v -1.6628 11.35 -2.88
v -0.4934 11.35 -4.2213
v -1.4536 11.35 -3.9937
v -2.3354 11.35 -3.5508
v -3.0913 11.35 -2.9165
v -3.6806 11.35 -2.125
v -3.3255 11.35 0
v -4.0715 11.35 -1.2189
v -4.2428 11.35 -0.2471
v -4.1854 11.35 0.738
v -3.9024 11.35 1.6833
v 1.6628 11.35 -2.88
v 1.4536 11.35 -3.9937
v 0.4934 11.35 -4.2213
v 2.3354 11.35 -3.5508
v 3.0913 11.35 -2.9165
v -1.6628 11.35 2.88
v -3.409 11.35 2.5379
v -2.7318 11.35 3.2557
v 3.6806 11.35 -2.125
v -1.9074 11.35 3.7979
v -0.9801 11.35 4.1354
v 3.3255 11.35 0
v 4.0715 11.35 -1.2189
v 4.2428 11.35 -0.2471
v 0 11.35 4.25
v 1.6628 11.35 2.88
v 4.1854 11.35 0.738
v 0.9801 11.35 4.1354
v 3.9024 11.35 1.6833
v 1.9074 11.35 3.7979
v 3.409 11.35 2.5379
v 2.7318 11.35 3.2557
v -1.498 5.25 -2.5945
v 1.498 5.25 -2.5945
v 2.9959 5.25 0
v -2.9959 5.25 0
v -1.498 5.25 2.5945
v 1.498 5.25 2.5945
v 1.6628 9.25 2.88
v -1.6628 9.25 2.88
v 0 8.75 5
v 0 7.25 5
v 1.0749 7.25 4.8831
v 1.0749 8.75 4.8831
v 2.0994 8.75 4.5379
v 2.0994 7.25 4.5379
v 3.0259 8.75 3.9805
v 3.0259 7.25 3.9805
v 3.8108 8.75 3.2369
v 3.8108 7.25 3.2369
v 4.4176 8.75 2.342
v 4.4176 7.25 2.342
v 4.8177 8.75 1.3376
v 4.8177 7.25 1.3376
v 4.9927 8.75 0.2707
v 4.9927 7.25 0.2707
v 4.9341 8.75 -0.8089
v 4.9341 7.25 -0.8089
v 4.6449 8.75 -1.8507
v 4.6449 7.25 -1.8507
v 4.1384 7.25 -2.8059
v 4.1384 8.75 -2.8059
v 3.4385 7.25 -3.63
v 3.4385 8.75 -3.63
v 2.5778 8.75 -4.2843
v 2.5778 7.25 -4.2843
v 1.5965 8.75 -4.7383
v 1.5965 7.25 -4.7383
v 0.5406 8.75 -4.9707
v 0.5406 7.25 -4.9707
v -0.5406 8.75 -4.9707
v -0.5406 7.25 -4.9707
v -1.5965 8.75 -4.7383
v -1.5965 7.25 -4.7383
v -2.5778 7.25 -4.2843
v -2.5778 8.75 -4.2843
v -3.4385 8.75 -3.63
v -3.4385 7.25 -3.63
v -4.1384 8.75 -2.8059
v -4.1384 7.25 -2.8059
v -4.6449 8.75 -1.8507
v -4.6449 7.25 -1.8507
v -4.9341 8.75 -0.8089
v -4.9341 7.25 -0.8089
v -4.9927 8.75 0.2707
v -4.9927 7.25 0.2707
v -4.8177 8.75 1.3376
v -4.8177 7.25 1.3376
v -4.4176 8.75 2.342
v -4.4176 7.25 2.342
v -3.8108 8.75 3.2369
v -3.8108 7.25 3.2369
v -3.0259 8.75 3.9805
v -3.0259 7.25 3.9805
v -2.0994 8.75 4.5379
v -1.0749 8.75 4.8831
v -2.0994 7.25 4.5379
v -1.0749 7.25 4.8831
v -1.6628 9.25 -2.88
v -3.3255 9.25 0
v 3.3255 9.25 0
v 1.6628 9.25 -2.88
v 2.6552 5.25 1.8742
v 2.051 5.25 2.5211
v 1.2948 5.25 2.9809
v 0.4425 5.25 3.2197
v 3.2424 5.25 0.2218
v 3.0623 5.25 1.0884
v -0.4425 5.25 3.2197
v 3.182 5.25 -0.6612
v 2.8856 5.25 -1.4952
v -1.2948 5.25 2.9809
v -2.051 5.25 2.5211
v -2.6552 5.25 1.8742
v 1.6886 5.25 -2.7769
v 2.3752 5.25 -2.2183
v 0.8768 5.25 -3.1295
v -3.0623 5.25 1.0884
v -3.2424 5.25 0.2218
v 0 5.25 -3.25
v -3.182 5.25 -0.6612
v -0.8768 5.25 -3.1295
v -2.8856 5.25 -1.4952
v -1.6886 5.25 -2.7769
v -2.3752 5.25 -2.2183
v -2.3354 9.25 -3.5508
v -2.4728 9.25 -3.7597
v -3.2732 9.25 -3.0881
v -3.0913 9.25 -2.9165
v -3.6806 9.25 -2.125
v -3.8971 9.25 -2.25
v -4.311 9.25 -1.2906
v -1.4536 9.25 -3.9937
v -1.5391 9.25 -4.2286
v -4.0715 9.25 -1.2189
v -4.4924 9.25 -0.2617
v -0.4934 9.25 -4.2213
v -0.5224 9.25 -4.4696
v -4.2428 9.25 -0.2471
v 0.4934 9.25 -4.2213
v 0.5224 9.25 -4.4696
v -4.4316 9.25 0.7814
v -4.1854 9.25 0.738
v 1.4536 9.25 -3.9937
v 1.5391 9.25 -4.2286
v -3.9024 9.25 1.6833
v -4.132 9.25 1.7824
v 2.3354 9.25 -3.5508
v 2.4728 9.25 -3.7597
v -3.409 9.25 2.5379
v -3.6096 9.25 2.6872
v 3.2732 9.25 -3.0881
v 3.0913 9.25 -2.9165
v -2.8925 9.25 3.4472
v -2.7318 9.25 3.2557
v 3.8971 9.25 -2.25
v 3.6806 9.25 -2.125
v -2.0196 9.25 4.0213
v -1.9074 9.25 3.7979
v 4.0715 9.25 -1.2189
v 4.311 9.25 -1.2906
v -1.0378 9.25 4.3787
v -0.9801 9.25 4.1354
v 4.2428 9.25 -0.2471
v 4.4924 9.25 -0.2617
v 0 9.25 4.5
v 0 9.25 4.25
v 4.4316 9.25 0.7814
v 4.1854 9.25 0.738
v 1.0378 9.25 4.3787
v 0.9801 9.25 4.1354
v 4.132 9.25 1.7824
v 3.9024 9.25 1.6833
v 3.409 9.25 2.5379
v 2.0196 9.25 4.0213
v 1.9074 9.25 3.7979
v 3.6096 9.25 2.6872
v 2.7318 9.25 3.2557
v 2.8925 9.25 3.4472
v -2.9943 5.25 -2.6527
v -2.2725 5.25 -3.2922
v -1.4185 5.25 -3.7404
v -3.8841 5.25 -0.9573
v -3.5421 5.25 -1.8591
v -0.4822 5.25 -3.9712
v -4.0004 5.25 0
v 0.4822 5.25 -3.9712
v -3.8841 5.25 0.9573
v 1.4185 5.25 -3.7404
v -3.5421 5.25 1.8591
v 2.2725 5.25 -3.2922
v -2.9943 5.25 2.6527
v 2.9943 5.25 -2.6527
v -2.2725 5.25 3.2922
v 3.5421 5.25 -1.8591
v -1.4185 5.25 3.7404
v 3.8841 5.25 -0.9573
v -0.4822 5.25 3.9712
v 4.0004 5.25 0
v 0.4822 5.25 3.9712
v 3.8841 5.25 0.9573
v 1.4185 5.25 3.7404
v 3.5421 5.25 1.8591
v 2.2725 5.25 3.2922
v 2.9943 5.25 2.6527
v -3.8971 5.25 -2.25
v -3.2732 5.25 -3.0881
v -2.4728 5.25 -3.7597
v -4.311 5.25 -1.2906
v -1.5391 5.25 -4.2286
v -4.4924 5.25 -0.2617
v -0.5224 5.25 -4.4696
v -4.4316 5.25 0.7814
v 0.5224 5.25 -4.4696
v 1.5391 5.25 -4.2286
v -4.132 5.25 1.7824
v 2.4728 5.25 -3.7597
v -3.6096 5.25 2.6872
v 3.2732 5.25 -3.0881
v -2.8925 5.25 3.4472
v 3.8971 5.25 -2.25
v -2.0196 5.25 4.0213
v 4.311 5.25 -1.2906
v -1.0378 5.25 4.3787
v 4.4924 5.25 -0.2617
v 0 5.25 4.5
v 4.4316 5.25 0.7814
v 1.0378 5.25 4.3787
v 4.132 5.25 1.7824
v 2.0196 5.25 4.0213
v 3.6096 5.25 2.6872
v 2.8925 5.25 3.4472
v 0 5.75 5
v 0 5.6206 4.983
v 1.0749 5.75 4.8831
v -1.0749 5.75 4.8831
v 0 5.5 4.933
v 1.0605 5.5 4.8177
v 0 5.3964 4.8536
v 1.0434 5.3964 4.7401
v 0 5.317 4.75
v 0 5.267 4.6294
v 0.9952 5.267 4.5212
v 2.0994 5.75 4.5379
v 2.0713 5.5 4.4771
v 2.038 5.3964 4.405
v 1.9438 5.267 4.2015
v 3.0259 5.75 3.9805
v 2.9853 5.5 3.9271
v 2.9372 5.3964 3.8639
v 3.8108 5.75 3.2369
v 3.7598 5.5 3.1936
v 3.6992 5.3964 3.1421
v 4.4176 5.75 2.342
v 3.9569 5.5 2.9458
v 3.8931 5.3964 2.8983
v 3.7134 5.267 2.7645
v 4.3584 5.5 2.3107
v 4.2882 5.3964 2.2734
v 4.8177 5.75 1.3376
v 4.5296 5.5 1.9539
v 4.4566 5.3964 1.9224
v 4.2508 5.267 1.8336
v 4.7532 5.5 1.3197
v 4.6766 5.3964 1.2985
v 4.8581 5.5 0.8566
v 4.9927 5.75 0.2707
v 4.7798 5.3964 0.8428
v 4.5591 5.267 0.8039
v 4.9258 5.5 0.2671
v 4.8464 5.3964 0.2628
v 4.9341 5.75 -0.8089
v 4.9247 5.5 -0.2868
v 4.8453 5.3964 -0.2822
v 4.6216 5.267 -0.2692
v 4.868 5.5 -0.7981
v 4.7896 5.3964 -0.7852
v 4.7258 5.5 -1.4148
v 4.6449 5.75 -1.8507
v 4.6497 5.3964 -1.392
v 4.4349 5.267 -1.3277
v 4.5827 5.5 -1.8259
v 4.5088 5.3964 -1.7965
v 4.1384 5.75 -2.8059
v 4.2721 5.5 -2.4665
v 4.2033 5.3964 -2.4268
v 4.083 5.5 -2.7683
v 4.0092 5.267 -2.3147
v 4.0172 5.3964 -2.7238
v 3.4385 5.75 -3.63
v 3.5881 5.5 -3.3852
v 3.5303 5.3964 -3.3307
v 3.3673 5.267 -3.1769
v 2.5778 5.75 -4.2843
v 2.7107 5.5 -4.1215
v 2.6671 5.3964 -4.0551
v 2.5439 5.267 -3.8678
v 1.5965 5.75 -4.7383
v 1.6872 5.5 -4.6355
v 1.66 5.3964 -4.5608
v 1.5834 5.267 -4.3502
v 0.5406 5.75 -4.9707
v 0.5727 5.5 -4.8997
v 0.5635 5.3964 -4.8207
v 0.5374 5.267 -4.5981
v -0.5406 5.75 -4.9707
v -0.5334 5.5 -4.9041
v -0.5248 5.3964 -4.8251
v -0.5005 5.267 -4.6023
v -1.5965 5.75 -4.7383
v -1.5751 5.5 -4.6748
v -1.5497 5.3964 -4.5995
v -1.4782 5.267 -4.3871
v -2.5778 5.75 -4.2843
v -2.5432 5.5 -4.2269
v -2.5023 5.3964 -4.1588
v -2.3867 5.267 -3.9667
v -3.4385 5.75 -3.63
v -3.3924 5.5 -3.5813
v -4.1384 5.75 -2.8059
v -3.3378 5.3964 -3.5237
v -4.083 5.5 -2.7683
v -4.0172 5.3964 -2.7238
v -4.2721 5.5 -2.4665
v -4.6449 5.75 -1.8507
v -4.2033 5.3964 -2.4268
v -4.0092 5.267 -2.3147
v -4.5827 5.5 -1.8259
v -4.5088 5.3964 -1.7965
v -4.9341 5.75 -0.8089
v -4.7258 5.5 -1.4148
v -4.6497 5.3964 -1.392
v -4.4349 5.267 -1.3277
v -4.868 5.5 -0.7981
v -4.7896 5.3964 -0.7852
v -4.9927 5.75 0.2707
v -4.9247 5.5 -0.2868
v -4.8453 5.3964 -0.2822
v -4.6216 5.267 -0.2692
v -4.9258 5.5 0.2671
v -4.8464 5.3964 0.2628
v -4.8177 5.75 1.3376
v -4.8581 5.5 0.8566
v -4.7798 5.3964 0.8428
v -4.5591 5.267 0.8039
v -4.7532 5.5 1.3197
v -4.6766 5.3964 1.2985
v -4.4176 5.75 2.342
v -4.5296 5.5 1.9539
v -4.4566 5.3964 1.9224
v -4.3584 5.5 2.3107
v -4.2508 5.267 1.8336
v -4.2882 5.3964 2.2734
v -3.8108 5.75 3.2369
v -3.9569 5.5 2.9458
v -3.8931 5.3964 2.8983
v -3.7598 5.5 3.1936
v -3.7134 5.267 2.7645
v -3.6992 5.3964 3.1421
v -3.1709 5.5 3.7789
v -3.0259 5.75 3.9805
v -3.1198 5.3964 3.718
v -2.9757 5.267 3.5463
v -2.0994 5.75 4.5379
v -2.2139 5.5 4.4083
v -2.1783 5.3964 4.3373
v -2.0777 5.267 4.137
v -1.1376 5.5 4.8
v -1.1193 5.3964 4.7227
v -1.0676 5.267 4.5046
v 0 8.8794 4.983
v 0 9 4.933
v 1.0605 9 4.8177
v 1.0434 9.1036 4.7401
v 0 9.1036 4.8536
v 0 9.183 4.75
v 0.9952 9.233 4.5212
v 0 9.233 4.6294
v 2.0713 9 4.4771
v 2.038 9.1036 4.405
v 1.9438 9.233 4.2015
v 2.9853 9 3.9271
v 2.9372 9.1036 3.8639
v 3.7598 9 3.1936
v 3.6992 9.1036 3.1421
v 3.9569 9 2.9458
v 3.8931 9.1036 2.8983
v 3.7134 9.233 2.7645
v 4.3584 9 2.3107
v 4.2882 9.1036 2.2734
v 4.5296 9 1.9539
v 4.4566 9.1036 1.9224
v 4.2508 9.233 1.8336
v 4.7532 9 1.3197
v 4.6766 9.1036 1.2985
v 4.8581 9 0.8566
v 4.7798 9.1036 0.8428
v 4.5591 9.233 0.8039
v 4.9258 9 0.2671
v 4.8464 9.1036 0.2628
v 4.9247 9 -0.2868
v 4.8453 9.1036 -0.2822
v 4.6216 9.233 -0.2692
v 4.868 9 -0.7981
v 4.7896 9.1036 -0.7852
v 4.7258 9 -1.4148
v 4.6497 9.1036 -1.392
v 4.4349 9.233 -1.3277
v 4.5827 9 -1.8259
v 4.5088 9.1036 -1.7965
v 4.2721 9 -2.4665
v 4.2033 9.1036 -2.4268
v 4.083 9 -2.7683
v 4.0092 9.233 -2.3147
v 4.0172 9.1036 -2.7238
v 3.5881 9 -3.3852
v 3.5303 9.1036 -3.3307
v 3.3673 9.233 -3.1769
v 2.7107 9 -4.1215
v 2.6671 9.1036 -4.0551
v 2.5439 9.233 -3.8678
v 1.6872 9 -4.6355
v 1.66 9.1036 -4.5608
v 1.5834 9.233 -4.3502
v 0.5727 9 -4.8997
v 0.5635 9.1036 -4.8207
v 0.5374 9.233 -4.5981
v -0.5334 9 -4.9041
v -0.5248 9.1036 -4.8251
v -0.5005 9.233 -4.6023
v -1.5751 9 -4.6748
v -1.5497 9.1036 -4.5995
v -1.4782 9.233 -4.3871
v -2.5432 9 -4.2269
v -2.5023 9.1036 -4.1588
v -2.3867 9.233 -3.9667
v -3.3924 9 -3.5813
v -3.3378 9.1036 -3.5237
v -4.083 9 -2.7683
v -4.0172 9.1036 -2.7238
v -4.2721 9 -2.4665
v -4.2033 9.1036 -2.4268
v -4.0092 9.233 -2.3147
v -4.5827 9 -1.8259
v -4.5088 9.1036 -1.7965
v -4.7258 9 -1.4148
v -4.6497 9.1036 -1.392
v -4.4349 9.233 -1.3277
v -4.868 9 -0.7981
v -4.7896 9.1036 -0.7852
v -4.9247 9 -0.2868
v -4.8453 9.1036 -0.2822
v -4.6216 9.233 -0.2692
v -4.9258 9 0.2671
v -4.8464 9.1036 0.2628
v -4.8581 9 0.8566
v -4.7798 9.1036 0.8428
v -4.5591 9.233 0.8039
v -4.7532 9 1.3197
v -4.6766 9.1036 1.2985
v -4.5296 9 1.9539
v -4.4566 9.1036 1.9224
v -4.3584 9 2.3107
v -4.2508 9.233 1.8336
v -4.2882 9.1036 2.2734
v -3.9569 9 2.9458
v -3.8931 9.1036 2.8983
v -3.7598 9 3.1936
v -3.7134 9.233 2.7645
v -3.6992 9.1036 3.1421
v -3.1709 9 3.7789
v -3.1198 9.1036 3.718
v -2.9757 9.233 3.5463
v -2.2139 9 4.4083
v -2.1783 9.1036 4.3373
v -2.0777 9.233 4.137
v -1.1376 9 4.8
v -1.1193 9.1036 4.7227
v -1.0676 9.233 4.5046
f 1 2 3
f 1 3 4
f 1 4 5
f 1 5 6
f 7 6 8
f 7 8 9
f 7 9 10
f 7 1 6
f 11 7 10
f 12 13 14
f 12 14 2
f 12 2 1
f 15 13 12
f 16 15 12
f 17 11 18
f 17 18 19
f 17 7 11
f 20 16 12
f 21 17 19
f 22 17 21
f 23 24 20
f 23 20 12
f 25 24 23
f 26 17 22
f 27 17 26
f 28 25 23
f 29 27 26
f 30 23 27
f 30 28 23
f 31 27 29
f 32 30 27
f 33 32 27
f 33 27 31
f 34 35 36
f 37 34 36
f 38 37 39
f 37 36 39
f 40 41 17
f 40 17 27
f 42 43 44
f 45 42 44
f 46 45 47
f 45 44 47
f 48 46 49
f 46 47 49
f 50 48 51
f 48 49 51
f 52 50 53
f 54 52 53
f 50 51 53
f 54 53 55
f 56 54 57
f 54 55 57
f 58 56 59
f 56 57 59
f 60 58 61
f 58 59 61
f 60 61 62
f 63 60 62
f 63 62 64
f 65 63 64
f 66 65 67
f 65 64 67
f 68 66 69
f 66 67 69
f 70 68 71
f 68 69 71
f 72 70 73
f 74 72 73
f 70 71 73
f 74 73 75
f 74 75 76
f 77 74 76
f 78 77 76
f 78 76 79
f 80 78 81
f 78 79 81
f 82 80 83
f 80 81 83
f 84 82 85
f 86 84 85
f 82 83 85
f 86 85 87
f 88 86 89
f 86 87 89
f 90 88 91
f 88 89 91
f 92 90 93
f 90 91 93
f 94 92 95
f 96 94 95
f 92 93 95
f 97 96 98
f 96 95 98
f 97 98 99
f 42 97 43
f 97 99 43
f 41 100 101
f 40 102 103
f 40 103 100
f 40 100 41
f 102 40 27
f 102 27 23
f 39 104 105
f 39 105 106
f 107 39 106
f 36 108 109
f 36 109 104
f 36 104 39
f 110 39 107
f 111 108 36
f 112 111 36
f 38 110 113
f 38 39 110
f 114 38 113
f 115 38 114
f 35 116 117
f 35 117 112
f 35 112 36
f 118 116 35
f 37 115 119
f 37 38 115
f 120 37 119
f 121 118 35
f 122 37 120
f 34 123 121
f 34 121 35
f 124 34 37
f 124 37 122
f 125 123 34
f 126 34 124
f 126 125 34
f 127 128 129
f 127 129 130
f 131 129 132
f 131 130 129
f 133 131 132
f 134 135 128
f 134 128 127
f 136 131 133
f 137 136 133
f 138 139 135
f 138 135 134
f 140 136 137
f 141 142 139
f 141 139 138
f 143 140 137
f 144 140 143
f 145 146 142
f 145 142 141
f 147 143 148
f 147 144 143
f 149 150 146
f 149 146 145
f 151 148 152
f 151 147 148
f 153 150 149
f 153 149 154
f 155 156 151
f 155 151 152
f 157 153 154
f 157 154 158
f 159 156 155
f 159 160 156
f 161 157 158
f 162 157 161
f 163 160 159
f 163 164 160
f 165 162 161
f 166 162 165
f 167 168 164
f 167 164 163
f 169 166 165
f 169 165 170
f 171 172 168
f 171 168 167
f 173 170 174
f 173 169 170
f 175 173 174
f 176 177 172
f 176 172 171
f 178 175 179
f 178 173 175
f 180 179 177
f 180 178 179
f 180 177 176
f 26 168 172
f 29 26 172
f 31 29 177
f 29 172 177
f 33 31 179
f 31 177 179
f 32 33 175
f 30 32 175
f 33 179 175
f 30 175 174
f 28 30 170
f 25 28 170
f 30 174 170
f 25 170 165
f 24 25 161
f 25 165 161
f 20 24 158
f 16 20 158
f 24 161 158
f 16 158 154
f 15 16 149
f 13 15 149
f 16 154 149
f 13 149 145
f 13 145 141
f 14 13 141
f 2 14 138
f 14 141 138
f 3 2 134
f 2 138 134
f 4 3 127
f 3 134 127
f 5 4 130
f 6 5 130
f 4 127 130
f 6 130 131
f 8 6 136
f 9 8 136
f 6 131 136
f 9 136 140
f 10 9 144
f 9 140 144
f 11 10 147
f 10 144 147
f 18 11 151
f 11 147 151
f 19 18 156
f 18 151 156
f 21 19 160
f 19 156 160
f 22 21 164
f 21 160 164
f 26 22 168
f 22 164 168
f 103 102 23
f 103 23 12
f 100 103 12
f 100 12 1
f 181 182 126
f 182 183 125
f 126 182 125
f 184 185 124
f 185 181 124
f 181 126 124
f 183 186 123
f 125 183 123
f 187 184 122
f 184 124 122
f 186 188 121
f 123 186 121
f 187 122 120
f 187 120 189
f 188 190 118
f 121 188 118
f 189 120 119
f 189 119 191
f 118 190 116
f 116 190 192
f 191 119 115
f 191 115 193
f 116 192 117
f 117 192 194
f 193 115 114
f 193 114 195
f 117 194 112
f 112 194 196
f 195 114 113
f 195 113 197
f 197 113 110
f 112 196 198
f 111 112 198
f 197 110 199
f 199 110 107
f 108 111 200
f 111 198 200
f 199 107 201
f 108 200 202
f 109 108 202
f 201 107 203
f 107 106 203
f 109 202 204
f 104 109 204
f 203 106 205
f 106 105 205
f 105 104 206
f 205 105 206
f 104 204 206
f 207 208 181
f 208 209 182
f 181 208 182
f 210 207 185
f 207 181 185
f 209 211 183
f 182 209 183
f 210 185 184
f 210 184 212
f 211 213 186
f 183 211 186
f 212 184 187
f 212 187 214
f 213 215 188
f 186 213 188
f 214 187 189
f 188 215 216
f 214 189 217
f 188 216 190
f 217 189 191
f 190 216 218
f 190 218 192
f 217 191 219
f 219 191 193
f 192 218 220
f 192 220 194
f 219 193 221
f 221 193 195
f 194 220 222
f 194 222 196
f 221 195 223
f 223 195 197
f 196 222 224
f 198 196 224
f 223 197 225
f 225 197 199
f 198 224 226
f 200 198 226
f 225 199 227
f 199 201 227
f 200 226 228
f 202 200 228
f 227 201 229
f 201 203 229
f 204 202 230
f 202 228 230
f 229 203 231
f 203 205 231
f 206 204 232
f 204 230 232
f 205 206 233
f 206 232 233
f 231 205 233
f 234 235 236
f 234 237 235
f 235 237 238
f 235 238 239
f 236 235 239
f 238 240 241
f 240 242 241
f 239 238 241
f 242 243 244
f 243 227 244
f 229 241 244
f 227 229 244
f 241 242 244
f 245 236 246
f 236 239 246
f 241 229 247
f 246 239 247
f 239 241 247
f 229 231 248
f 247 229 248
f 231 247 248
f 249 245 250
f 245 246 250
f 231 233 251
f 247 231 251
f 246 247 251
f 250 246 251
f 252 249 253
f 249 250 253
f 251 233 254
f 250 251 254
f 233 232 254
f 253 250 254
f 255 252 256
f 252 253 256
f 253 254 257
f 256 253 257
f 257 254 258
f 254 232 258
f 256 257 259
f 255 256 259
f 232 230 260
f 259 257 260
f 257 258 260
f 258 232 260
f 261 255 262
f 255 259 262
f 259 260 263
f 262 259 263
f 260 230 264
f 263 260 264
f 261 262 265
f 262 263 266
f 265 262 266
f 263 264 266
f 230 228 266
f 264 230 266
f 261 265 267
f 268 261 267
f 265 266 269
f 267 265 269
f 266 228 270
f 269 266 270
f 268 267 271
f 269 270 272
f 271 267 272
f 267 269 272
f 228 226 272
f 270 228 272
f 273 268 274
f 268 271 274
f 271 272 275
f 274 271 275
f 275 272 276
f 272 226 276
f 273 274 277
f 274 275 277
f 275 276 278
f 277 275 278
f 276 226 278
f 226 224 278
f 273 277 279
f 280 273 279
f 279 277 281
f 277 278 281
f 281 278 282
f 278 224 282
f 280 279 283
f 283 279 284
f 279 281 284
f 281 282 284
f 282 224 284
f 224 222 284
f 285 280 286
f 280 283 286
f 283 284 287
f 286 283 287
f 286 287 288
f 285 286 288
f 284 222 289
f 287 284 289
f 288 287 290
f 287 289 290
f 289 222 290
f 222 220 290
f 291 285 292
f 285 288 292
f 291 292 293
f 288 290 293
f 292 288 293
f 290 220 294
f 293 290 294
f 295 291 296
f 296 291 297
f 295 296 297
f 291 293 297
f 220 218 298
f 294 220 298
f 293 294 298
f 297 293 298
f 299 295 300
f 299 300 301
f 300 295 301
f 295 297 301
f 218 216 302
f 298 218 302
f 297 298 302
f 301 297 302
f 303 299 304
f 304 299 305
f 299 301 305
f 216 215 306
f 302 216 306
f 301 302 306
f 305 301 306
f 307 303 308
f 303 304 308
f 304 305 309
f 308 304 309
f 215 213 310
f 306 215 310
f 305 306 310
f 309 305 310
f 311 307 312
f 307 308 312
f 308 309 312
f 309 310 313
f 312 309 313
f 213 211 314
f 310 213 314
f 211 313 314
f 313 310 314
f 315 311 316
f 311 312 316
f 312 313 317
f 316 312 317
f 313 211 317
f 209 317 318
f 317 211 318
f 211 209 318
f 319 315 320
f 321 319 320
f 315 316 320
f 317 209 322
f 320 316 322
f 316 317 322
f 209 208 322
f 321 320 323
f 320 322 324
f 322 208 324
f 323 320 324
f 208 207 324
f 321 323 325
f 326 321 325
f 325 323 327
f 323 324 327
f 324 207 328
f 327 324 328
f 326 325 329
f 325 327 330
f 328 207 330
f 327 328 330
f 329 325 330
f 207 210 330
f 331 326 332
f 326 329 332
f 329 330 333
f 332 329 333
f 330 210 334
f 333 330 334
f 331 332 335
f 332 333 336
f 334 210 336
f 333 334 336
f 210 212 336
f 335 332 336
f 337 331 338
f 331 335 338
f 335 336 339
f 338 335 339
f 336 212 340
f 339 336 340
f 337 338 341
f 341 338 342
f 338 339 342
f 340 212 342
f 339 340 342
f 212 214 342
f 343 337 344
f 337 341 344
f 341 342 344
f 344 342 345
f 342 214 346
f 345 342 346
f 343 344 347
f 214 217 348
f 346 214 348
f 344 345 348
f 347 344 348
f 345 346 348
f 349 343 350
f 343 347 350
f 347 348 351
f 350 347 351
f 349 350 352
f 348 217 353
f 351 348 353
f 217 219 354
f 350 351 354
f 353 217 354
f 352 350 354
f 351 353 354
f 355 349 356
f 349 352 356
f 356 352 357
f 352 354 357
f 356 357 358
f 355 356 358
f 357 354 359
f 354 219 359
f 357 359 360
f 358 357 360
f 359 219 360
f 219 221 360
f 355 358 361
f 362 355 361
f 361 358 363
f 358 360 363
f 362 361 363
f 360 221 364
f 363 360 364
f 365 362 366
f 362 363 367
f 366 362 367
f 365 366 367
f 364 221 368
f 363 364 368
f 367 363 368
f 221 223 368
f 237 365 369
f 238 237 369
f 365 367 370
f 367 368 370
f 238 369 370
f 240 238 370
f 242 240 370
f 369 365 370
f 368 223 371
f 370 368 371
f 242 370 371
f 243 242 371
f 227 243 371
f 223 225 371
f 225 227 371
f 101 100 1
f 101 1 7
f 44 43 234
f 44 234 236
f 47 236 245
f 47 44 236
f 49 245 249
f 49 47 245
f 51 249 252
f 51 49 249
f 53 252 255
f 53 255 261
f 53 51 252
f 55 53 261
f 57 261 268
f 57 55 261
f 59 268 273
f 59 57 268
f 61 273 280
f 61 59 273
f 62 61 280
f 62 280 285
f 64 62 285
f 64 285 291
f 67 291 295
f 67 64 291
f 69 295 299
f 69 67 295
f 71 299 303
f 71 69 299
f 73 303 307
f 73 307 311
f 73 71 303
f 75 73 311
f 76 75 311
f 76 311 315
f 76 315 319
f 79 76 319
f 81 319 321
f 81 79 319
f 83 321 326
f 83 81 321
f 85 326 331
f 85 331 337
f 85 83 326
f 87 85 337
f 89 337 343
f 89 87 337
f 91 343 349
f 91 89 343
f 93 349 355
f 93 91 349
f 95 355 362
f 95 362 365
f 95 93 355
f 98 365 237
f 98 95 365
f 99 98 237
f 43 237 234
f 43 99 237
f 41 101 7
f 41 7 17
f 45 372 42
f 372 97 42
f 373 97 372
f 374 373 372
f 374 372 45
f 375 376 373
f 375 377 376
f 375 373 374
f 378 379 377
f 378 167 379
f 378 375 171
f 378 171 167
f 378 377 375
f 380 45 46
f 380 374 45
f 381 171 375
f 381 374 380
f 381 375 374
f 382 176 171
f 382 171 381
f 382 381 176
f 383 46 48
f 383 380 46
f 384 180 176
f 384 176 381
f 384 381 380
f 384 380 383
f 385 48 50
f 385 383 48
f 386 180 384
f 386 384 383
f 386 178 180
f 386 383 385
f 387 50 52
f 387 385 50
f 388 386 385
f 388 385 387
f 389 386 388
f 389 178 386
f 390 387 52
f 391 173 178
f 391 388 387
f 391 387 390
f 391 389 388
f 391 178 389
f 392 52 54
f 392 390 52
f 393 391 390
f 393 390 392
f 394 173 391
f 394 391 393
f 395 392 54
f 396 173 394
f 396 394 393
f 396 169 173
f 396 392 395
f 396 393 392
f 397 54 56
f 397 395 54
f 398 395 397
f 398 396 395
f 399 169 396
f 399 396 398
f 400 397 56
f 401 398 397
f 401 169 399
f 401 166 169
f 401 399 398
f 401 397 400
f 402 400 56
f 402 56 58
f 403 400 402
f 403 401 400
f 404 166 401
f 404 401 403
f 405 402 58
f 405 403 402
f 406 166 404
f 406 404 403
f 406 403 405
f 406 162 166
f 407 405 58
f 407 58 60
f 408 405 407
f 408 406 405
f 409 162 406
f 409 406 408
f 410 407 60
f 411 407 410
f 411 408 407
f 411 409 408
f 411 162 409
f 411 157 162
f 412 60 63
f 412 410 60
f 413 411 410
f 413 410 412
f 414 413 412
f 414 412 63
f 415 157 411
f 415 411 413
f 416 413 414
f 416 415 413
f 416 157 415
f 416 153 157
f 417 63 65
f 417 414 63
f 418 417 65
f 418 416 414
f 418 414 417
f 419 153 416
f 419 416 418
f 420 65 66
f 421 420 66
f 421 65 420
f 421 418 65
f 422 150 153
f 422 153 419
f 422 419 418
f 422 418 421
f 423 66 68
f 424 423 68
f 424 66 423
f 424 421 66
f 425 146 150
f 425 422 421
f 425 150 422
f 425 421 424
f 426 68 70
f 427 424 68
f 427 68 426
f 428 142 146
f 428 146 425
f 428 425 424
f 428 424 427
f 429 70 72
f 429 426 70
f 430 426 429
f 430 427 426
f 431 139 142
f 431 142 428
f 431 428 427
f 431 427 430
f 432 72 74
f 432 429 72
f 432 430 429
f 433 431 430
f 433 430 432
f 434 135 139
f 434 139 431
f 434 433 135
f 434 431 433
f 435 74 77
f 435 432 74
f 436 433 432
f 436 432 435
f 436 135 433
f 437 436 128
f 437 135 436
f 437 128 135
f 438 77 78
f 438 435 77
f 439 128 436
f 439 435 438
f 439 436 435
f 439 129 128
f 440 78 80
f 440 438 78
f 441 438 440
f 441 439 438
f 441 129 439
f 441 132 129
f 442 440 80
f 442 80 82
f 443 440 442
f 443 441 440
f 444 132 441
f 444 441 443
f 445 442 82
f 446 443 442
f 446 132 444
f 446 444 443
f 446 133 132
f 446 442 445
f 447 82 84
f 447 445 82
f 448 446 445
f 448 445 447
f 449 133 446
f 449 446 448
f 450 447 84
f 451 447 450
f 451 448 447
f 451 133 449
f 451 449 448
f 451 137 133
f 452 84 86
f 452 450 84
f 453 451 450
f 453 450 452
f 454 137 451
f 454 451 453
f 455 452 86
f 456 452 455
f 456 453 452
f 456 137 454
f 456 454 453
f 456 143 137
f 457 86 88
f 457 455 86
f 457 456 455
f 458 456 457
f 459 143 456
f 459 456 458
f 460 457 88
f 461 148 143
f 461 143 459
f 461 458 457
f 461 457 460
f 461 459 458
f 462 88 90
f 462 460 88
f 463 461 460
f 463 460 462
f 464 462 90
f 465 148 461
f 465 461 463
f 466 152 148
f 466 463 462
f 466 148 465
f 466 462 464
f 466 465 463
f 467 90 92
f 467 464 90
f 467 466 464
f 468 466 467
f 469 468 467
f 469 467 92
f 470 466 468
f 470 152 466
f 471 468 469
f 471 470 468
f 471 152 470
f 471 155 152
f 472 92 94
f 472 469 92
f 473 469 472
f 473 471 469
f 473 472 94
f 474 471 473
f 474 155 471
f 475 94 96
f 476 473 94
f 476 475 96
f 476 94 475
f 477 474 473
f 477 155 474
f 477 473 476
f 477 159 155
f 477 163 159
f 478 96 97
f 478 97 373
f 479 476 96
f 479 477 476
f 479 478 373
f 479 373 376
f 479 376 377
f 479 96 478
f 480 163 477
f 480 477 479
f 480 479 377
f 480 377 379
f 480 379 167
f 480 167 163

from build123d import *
from OCP.BRepFilletAPI import BRepFilletAPI_MakeChamfer

# Parameters (mm, degrees)
BOSS_EXTRUDE1_DEPTH  = 1.75
BOSS_EXTRUDE2_DEPTH  = 0.5
BOSS_EXTRUDE5_DEPTH  = 3.5
SKETCH4_R            = 3.5
BOSS_EXTRUDE7_DEPTH  = 2
SKETCH11_R           = 4.505443821
SKETCH11_R_2         = 3.5
CUT_EXTRUDE3_DEPTH   = 2
SKETCH12_R           = 3.5
CUT_EXTRUDE4_DEPTH   = 3
BOSS_EXTRUDE8_DEPTH  = 2.5
CHAMFER1_SIZE        = 0.5
CHAMFER1_SIZE2       = 0.288675135
SKETCH17_R           = 3.25
BOSS_EXTRUDE9_DEPTH  = 3
SKETCH18_R           = 1.768100224
CUT_EXTRUDE8_DEPTH   = 2.25
SKETCH20_R           = 5
BOSS_EXTRUDE10_DEPTH = 2
SKETCH21_R           = 5
BOSS_EXTRUDE11_DEPTH = 2
FILLET1_R            = 0.5
SKETCH25_R           = 4.000350088
CUT_EXTRUDE9_DEPTH   = 10
SKETCH26_R           = 4.25
BOSS_EXTRUDE12_DEPTH = 2.1


with BuildPart() as part:
    # Sketch1 → Boss-Extrude1 (new body)
    with BuildSketch(Plane(origin=(0, 0, 0), x_dir=(1, 0, 0), z_dir=(0, 1, 0))):
        Polygon((0.658179307, 0), (0.329089653, 0.57), (-0.329089653, 0.57), (-0.658179307, 0), (-0.329089653, -0.57), (0.329089653, -0.57), align=None)
    extrude(amount=BOSS_EXTRUDE1_DEPTH)

    # Sketch2 → Boss-Extrude2 (add)
    with BuildSketch(Plane(origin=(0, 1.75, 0), x_dir=(1, 0, 0), z_dir=(0, 1, 0))):
        Polygon((0.658179307, 0), (0.558124156, -0.173300605), (4.375, 0), (0.558578548, 0.172513574), align=None)
        Polygon((0, 0.197762982), (0, 0), (0, -0.198641554), (0.558124156, -0.173300605), (0.658179307, 0), (0.558578548, 0.172513574), align=None)
    extrude(amount=BOSS_EXTRUDE2_DEPTH)

    # Sketch3 → Boss-Extrude5 (add)
    with BuildSketch(Plane(origin=(0, 1.75, 0), x_dir=(1, 0, 0), z_dir=(0, 1, 0))):
        Polygon((0.658179307, 0), (0.329089653, 0.57), (-0.329089653, 0.57), (-0.658179307, 0), (-0.329089653, -0.57), (0.329089653, -0.57), align=None)
    extrude(amount=BOSS_EXTRUDE5_DEPTH)

    # Sketch4 → Boss-Extrude7 (add)
    with BuildSketch(Plane(origin=(0, 5.25, 0), x_dir=(1, 0, 0), z_dir=(0, 1, 0))):
        with Locations(Location((0, 0, 0), (0, 0, 270))):
            Circle(SKETCH4_R)
    extrude(amount=BOSS_EXTRUDE7_DEPTH)

    # Sketch11 → Cut-Extrude3 (cut)
    with BuildSketch(Plane(origin=(0, 1.75, 0), x_dir=(-1, 0, 0), z_dir=(0, -1, 0))):
        Circle(SKETCH11_R)
        with Locations(Location((0, 0, 0), (0, 0, 270))):
            Circle(SKETCH11_R_2, mode=Mode.SUBTRACT)
    extrude(amount=-CUT_EXTRUDE3_DEPTH, mode=Mode.SUBTRACT)

    # Sketch12 → Cut-Extrude4 (cut)
    with BuildSketch(Plane(origin=(0, 0, 0), x_dir=(-1, 0, 0), z_dir=(0, -1, 0))):
        with Locations(Location((0, 0, 0), (0, 0, 270))):
            Circle(SKETCH12_R)
    extrude(amount=-CUT_EXTRUDE4_DEPTH, mode=Mode.SUBTRACT)

    # Sketch16 → Boss-Extrude8 (add)
    with BuildSketch(Plane(origin=(0, 3, 0), x_dir=(-1, 0, 0), z_dir=(0, -1, 0))):
        Polygon((0.55, -0.952627944), (1.1, 0), (0.658179307, 0), (0.329089653, -0.57), (-0.329089653, -0.57), (-0.658179307, 0), (-1.1, 0), (-0.55, -0.952627944), align=None)
        Polygon((0.658179307, 0), (1.1, 0), (0.55, 0.952627944), (-0.55, 0.952627944), (-1.1, 0), (-0.658179307, 0), (-0.329089653, 0.57), (0.329089653, 0.57), align=None)
        Polygon((-0.658179307, 0), (0.658179307, 0), (0.329089653, 0.57), (-0.329089653, 0.57), align=None)
        Polygon((0.329089653, -0.57), (0.658179307, 0), (-0.658179307, 0), (-0.329089653, -0.57), align=None)
    extrude(amount=-BOSS_EXTRUDE8_DEPTH)

    # Chamfer1: one chamfer whose edges measure the first distance from different faces: ONE call of the kernel's chamfer builder (chamfer() names one face for all edges)
    chamfer1_edges_1 = [part.edges().sort_by_distance(p)[0] for p in [
        (-0.825, 5.25, -0.476313972),
    ]]
    chamfer1_side_1 = [part.faces().sort_by_distance(p)[0] for p in [
        (-0.825, 4.125, -0.476313972),
    ]]
    chamfer1_edges_2 = [part.edges().sort_by_distance(p)[0] for p in [
        (0, 5.25, -0.952627944),
    ]]
    chamfer1_side_2 = [part.faces().sort_by_distance(p)[0] for p in [
        (0, 4.125, -0.952627944),
    ]]
    chamfer1_edges_3 = [part.edges().sort_by_distance(p)[0] for p in [
        (0.825, 5.25, -0.476313972),
    ]]
    chamfer1_side_3 = [part.faces().sort_by_distance(p)[0] for p in [
        (0.825, 4.125, -0.476313972),
    ]]
    chamfer1_edges_4 = [part.edges().sort_by_distance(p)[0] for p in [
        (0.825, 5.25, 0.476313972),
    ]]
    chamfer1_side_4 = [part.faces().sort_by_distance(p)[0] for p in [
        (0.825, 4.125, 0.476313972),
    ]]
    chamfer1_edges_5 = [part.edges().sort_by_distance(p)[0] for p in [
        (0, 5.25, 0.952627944),
    ]]
    chamfer1_side_5 = [part.faces().sort_by_distance(p)[0] for p in [
        (0, 4.125, 0.952627944),
    ]]
    chamfer1_edges_6 = [part.edges().sort_by_distance(p)[0] for p in [
        (-0.825, 5.25, 0.476313972),
    ]]
    chamfer1_side_6 = [part.faces().sort_by_distance(p)[0] for p in [
        (-0.825, 4.125, 0.476313972),
    ]]
    chamfer1 = BRepFilletAPI_MakeChamfer(part.part.solid().wrapped)
    for e in chamfer1_edges_1:
        chamfer1.Add(CHAMFER1_SIZE, CHAMFER1_SIZE2, e.wrapped, chamfer1_side_1[0].wrapped)  # the first distance lies on this face
    for e in chamfer1_edges_2:
        chamfer1.Add(CHAMFER1_SIZE, CHAMFER1_SIZE2, e.wrapped, chamfer1_side_2[0].wrapped)  # the first distance lies on this face
    for e in chamfer1_edges_3:
        chamfer1.Add(CHAMFER1_SIZE, CHAMFER1_SIZE2, e.wrapped, chamfer1_side_3[0].wrapped)  # the first distance lies on this face
    for e in chamfer1_edges_4:
        chamfer1.Add(CHAMFER1_SIZE, CHAMFER1_SIZE2, e.wrapped, chamfer1_side_4[0].wrapped)  # the first distance lies on this face
    for e in chamfer1_edges_5:
        chamfer1.Add(CHAMFER1_SIZE, CHAMFER1_SIZE2, e.wrapped, chamfer1_side_5[0].wrapped)  # the first distance lies on this face
    for e in chamfer1_edges_6:
        chamfer1.Add(CHAMFER1_SIZE, CHAMFER1_SIZE2, e.wrapped, chamfer1_side_6[0].wrapped)  # the first distance lies on this face
    add(Compound.cast(chamfer1.Shape()), mode=Mode.REPLACE)

    # Sketch17 → Boss-Extrude9 (add)
    with BuildSketch(Plane(origin=(0, 3, 0), x_dir=(-1, 0, 0), z_dir=(0, -1, 0))):
        with Locations(Location((0, 0, 0), (0, 0, 90))):
            Circle(SKETCH17_R)
        Polygon((-2.995914926, 0), (-1.497957463, -2.594538434), (1.497957463, -2.594538434), (2.995914926, 0), (1.497957463, 2.594538434), (-1.497957463, 2.594538434), align=None, mode=Mode.SUBTRACT)
    extrude(amount=-BOSS_EXTRUDE9_DEPTH)

    # Sketch18 → Cut-Extrude8 (cut)
    with BuildSketch(Plane(origin=(0, 3, 0), x_dir=(-1, 0, 0), z_dir=(0, -1, 0))):
        Circle(SKETCH18_R)
    extrude(amount=-CUT_EXTRUDE8_DEPTH, mode=Mode.SUBTRACT)

    # Sketch20 → Boss-Extrude10 (add)
    with BuildSketch(Plane(origin=(0, 7.25, 0), x_dir=(1, 0, 0), z_dir=(0, 1, 0))):
        with Locations(Location((0, 0, 0), (0, 0, 270))):
            Circle(SKETCH20_R)
    extrude(amount=-BOSS_EXTRUDE10_DEPTH)

    # Sketch21 → Boss-Extrude11 (add)
    with BuildSketch(Plane(origin=(0, 7.25, 0), x_dir=(1, 0, 0), z_dir=(0, 1, 0))):
        with Locations(Location((0, 0, 0), (0, 0, 270))):
            Circle(SKETCH21_R)
    extrude(amount=BOSS_EXTRUDE11_DEPTH)

    # Fillet1
    fillet1_edges = [part.edges().sort_by_distance(p)[0] for p in [
        (0, 5.25, -5),
        (0, 9.25, -5),
    ]]
    fillet(fillet1_edges, radius=FILLET1_R)

    # Sketch25 → Cut-Extrude9 (cut)
    with BuildSketch(Plane(origin=(0, 5.25, 0), x_dir=(-1, 0, 0), z_dir=(0, -1, 0))):
        Circle(SKETCH25_R)
    extrude(amount=CUT_EXTRUDE9_DEPTH, mode=Mode.SUBTRACT)

    # Sketch26 → Boss-Extrude12 (add)
    with BuildSketch(Plane(origin=(0, 9.25, 0), x_dir=(1, 0, 0), z_dir=(0, 1, 0))):
        with Locations(Location((0, 0, 0), (0, 0, 270))):
            Circle(SKETCH26_R)
        Polygon((1.662768775, -2.88), (3.325537551, 0), (1.662768775, 2.88), (-1.662768775, 2.88), (-3.325537551, 0), (-1.662768775, -2.88), align=None, mode=Mode.SUBTRACT)
    extrude(amount=BOSS_EXTRUDE12_DEPTH)


solid = part.part
